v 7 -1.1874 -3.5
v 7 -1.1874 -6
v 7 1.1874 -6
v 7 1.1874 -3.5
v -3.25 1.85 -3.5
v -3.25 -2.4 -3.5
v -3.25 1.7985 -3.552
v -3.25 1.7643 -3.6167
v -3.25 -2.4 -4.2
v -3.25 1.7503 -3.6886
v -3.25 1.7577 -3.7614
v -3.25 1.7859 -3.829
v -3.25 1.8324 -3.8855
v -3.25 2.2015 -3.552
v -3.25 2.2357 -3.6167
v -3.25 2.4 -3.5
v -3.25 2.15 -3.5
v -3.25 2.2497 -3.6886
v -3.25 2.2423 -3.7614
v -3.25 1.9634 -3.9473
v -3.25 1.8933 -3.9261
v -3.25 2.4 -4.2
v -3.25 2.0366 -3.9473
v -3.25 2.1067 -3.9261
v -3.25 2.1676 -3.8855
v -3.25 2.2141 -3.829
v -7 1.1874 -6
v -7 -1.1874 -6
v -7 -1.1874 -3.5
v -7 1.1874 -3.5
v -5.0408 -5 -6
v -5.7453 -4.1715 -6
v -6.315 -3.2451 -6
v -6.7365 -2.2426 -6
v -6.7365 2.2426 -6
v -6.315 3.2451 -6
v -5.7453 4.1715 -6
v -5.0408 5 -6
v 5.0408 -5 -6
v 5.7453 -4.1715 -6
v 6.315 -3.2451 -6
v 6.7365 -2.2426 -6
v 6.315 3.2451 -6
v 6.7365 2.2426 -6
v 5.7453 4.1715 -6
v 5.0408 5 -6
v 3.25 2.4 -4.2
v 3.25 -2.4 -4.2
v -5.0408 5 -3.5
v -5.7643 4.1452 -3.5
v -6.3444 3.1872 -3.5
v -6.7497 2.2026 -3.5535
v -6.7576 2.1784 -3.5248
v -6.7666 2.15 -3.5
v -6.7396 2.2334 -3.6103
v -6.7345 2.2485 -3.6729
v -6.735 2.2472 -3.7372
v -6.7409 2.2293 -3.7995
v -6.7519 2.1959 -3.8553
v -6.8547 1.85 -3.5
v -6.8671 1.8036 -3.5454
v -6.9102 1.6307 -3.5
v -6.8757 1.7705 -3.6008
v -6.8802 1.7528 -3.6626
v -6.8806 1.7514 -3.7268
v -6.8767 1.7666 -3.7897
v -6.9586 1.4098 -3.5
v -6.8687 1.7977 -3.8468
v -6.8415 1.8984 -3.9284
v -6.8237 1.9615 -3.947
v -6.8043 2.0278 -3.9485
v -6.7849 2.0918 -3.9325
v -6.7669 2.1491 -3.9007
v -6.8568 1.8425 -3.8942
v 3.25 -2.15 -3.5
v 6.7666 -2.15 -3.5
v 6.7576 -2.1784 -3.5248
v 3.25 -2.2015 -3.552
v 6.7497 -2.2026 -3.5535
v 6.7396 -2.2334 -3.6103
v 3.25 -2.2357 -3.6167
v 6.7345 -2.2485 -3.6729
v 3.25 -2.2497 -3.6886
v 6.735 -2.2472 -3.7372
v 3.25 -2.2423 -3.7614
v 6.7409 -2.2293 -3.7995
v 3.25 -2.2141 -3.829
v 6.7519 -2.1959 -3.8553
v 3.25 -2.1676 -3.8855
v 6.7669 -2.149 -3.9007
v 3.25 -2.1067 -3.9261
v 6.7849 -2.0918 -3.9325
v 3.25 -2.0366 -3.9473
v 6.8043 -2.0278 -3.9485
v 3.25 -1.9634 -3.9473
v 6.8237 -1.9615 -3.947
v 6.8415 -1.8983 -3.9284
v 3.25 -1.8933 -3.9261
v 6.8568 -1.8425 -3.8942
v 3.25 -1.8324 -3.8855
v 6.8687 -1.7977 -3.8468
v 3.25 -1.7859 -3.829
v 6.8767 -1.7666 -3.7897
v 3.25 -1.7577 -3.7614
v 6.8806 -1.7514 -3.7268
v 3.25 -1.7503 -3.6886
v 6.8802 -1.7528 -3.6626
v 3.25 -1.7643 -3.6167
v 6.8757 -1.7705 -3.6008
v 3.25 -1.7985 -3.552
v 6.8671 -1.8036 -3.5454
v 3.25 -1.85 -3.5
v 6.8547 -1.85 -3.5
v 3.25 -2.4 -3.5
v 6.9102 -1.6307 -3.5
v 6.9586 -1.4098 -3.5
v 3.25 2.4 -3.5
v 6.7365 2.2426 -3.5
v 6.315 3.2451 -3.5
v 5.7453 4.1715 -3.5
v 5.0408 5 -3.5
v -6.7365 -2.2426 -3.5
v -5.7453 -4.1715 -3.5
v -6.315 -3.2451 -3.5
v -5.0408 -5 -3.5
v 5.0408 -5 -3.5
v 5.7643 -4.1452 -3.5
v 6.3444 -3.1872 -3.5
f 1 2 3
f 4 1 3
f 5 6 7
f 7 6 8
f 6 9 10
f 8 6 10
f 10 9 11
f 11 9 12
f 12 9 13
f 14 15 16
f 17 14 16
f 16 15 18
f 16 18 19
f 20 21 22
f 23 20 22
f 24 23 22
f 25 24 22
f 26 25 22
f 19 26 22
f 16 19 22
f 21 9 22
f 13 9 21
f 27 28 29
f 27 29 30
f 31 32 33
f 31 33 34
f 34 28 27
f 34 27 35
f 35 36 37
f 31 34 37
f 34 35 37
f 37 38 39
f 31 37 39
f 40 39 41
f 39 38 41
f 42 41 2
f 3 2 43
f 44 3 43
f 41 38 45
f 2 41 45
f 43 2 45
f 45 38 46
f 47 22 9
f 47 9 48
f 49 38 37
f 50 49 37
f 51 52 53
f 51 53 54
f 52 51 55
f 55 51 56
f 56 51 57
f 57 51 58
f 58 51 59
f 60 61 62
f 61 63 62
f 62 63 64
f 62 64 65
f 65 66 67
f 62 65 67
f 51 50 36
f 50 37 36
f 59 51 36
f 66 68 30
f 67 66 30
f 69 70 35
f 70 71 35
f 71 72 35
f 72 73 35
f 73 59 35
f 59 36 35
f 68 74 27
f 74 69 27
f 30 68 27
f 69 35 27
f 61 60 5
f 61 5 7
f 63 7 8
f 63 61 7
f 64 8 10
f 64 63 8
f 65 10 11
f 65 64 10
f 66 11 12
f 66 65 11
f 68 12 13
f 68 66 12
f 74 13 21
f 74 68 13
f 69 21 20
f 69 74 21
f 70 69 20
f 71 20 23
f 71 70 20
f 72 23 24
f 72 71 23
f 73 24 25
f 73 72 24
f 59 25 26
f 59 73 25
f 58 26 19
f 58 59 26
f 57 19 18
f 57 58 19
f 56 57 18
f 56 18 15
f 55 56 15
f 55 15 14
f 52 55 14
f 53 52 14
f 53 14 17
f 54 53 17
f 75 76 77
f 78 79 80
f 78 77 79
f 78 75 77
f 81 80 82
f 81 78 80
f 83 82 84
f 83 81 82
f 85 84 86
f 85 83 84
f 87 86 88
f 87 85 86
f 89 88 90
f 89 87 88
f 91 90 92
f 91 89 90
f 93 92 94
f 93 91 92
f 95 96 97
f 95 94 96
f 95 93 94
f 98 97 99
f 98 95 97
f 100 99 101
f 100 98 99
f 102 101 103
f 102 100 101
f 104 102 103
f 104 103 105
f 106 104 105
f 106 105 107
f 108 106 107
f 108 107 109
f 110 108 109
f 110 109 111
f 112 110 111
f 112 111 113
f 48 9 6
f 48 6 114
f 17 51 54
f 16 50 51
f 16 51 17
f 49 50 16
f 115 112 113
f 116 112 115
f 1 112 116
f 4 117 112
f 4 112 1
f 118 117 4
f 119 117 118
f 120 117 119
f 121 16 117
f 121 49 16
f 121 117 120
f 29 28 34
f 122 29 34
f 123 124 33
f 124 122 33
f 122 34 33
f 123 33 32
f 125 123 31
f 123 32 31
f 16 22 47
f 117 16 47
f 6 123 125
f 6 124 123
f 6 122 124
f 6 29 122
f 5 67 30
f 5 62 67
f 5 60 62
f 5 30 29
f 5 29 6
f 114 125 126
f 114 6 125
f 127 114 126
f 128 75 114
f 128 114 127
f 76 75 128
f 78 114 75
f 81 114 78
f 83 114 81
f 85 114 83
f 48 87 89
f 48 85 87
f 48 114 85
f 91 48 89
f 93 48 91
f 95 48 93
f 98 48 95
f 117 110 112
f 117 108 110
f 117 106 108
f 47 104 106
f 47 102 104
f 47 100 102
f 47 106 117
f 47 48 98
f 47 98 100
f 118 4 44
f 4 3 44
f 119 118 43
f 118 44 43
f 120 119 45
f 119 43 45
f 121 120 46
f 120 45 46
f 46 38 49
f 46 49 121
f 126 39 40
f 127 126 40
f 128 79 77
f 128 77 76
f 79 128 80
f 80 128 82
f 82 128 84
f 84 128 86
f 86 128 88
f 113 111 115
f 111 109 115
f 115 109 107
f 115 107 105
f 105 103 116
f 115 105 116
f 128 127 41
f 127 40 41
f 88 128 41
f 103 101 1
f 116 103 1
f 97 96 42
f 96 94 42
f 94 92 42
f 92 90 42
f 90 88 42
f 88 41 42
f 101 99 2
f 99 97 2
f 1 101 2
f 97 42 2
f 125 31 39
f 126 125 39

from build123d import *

# Parameters (mm, degrees)
CYLINDER008_R           = 7.1
CYLINDER008_DEPTH       = 10
BOX005_W                = 21
BOX005_H                = 17
BOX005_DEPTH            = 8
CYLINDER005_R           = 2.5
CYLINDER005_DEPTH       = 10
CYLINDER004_R           = 0.25
CYLINDER004_DEPTH       = 10
CYLINDER004_PITCH_ANGLE = 90
CYLINDER003_R           = 0.25
CYLINDER003_DEPTH       = 10
CYLINDER003_PITCH_ANGLE = 90
BOX002_W                = 6.5
BOX002_H                = 4.8
BOX002_DEPTH            = 1
BOX003_W                = 10
BOX003_H                = 12
BOX003_DEPTH            = 3
BOX001_W                = 14
BOX001_H                = 10
BOX001_DEPTH            = 7.25


with BuildPart() as cylinder008:
    # Cylinder008 → Cylinder008 (new body)
    with BuildSketch(Plane.XY.offset(-6.5)):
        Circle(CYLINDER008_R)
    extrude(amount=CYLINDER008_DEPTH)


with BuildPart() as cube005:
    # Box005 → Box005 (new body)
    with BuildSketch(Plane(origin=(-9, -7, -3.5), x_dir=(1, 0, 0), z_dir=(0, 0, 1))):
        with Locations((10.5, 8.5)):
            Rectangle(BOX005_W, BOX005_H)
    extrude(amount=BOX005_DEPTH)


with BuildPart() as cylinder005:
    # Cylinder005 → Cylinder005 (new body)
    with BuildSketch(Plane.XY.offset(0.5)):
        Circle(CYLINDER005_R)
    extrude(amount=CYLINDER005_DEPTH)


with BuildPart() as fusion004:
    # Sphere001 → Sphere001 (revolve)
    with BuildSketch(Plane.XZ):
        with BuildLine():
            ThreePointArc((0, -3.1), (3.1, 0), (0, 3.1))
            Line((0, 3.1), (0, -3.1))
        make_face()
    revolve(axis=Axis((0, 0, 0), (0, 0, 1)))

    # Fusion004: union Cylinder005
    add(cylinder005.part)


with BuildPart() as cylinder004:
    # Cylinder004 → Cylinder004 (new body)
    with BuildSketch(Plane.XY):
        Circle(CYLINDER004_R)
    extrude(amount=CYLINDER004_DEPTH)


with BuildPart() as cylinder004_1:
    # Cylinder004 pitch: moved
    add(cylinder004.part.rotate(Axis((0, 0, 0), (0, 1, 0)), CYLINDER004_PITCH_ANGLE))


with BuildPart() as cylinder004_2:
    # Cylinder004 placement: moved
    add(cylinder004_1.part.moved(Location((0, -2, -3.7))))


with BuildPart() as fusion:
    # Cylinder003 → Cylinder003 (new body)
    with BuildSketch(Plane.XY):
        Circle(CYLINDER003_R)
    extrude(amount=CYLINDER003_DEPTH)


with BuildPart() as fusion_1:
    # Cylinder003 pitch: moved
    add(fusion.part.rotate(Axis((0, 0, 0), (0, 1, 0)), CYLINDER003_PITCH_ANGLE))


with BuildPart() as fusion_2:
    # Cylinder003 placement: moved
    add(fusion_1.part.moved(Location((-11, 2, -3.7))))

    # Fusion: union Cylinder004
    add(cylinder004_2.part)


with BuildPart() as fusion001:
    # Box002 → Box002 (new body)
    with BuildSketch(Plane(origin=(-3.25, -2.4, -4.2), x_dir=(1, 0, 0), z_dir=(0, 0, 1))):
        with Locations((3.25, 2.4)):
            Rectangle(BOX002_W, BOX002_H)
    extrude(amount=BOX002_DEPTH)

    # Fusion001: union Fusion
    add(fusion_2.part)


with BuildPart() as cube003:
    # Box003 → Box003 (new body)
    with BuildSketch(Plane(origin=(-5, -6, -3.5), x_dir=(1, 0, 0), z_dir=(0, 0, 1))):
        with Locations((5, 6)):
            Rectangle(BOX003_W, BOX003_H)
    extrude(amount=BOX003_DEPTH)


with BuildPart() as switch_plate:
    # Box001 → Box001 (new body)
    with BuildSketch(Plane(origin=(-7, -5, -6), x_dir=(1, 0, 0), z_dir=(0, 0, 1))):
        with Locations((7, 5)):
            Rectangle(BOX001_W, BOX001_H)
    extrude(amount=BOX001_DEPTH)

    # Cut: cut Cube003
    add(cube003.part, mode=Mode.SUBTRACT)

    # Cut001: cut Fusion001
    add(fusion001.part, mode=Mode.SUBTRACT)

    # Cut003: cut Fusion004
    add(fusion004.part, mode=Mode.SUBTRACT)

    # Cut004: cut Cube005
    add(cube005.part, mode=Mode.SUBTRACT)

    # Common002: intersect Cylinder008
    add(cylinder008.part, mode=Mode.INTERSECT)


solid = switch_plate.part
